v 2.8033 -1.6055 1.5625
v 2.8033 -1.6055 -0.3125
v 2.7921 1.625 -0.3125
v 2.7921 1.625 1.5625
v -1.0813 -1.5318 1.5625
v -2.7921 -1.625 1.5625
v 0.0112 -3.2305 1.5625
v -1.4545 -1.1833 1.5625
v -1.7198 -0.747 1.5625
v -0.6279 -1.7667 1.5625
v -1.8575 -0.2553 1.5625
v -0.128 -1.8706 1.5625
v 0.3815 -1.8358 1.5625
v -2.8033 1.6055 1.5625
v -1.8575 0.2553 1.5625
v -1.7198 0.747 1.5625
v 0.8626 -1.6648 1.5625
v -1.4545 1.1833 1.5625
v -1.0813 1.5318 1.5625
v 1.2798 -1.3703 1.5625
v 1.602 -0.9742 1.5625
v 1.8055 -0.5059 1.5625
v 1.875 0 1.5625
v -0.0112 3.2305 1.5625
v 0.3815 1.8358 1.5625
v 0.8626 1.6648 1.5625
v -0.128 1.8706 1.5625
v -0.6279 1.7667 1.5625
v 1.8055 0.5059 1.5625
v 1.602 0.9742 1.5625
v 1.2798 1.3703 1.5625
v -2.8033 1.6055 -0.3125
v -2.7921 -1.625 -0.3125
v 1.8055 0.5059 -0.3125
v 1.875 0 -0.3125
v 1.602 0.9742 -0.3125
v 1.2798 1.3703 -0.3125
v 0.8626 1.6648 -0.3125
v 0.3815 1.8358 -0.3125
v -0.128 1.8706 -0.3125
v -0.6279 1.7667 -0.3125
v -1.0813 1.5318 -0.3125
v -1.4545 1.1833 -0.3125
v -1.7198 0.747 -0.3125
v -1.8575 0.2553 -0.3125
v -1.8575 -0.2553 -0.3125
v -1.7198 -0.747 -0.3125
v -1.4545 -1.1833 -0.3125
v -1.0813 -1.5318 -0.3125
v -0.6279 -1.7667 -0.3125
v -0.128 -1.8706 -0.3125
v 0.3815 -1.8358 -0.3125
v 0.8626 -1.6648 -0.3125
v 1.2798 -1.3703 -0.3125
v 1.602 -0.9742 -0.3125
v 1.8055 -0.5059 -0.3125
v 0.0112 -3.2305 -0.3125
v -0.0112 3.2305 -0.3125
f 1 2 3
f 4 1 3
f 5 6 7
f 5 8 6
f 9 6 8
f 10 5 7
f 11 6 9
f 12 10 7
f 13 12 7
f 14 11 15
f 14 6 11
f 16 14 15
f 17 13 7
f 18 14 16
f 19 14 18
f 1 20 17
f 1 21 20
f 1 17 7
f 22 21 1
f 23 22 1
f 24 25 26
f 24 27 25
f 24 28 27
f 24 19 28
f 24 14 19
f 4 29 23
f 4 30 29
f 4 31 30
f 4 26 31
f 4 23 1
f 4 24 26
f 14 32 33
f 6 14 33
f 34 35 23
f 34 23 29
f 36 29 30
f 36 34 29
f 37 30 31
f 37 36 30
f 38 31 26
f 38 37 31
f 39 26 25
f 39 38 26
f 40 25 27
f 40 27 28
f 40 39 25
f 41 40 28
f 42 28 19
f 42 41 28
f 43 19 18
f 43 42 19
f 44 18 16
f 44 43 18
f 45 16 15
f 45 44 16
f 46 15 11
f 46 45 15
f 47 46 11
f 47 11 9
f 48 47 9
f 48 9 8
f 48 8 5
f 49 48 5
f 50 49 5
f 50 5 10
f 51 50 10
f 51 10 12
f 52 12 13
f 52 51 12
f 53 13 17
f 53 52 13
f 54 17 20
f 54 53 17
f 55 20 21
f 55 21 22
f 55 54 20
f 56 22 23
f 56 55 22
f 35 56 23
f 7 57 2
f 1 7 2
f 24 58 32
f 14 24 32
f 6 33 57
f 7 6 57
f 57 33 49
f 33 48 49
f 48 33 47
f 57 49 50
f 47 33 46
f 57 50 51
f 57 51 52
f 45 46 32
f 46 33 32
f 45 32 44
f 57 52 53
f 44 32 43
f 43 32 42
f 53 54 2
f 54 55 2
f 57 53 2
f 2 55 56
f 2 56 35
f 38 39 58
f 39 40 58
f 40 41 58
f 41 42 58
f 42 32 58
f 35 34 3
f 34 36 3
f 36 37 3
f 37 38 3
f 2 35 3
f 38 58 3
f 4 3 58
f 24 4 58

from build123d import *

# Parameters (mm, degrees)
SKETCH1_R           = 1.25
BOSS_EXTRUDE1_DEPTH = 1.25
SCALE1_SCALE        = 1.5


with BuildPart() as part:
    # Sketch1 → Boss-Extrude1 (new body)
    with BuildSketch(Plane.XY):
        Polygon((1.868889761, -1.070364136), (1.861407413, 1.083323942), (-0.007482348, 2.153688078), (-1.868889761, 1.070364136), (-1.861407413, -1.083323942), (0.007482348, -2.153688078), align=None)
        Circle(SKETCH1_R, mode=Mode.SUBTRACT)
    extrude(amount=BOSS_EXTRUDE1_DEPTH)


with BuildPart() as part_1:
    # Scale1: scaled about (0, 0, 0.625)
    add(part.part.scale(SCALE1_SCALE).moved(Location((0, 0, -0.3125))))


solid = part_1.part
